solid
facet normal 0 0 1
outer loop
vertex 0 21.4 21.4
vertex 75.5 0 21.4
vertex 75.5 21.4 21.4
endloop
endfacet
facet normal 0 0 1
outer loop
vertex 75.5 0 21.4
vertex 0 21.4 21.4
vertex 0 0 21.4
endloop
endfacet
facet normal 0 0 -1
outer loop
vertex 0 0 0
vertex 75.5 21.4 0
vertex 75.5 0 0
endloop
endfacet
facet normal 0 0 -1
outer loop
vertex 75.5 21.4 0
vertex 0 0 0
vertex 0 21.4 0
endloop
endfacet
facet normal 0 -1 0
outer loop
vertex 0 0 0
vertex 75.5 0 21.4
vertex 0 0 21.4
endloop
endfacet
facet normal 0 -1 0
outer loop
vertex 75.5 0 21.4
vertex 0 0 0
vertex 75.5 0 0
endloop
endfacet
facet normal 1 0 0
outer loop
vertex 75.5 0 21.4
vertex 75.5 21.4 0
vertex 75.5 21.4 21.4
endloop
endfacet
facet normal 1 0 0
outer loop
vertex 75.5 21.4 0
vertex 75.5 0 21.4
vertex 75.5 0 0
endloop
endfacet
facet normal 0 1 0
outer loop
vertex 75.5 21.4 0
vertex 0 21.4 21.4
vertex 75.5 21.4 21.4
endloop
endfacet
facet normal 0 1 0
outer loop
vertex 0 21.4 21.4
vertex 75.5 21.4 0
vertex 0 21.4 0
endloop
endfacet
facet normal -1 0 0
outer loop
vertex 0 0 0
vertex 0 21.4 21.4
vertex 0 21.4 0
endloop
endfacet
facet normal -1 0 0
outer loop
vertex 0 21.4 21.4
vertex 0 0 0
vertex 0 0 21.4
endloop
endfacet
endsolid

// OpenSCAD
/**
 * battery
 * @name battery
 * @description battery
 * @type component
 * @parent root
 */
module battery() {
    color("red")
    cube([75.5, 21.4, 21.4], center = false);
}


battery();
